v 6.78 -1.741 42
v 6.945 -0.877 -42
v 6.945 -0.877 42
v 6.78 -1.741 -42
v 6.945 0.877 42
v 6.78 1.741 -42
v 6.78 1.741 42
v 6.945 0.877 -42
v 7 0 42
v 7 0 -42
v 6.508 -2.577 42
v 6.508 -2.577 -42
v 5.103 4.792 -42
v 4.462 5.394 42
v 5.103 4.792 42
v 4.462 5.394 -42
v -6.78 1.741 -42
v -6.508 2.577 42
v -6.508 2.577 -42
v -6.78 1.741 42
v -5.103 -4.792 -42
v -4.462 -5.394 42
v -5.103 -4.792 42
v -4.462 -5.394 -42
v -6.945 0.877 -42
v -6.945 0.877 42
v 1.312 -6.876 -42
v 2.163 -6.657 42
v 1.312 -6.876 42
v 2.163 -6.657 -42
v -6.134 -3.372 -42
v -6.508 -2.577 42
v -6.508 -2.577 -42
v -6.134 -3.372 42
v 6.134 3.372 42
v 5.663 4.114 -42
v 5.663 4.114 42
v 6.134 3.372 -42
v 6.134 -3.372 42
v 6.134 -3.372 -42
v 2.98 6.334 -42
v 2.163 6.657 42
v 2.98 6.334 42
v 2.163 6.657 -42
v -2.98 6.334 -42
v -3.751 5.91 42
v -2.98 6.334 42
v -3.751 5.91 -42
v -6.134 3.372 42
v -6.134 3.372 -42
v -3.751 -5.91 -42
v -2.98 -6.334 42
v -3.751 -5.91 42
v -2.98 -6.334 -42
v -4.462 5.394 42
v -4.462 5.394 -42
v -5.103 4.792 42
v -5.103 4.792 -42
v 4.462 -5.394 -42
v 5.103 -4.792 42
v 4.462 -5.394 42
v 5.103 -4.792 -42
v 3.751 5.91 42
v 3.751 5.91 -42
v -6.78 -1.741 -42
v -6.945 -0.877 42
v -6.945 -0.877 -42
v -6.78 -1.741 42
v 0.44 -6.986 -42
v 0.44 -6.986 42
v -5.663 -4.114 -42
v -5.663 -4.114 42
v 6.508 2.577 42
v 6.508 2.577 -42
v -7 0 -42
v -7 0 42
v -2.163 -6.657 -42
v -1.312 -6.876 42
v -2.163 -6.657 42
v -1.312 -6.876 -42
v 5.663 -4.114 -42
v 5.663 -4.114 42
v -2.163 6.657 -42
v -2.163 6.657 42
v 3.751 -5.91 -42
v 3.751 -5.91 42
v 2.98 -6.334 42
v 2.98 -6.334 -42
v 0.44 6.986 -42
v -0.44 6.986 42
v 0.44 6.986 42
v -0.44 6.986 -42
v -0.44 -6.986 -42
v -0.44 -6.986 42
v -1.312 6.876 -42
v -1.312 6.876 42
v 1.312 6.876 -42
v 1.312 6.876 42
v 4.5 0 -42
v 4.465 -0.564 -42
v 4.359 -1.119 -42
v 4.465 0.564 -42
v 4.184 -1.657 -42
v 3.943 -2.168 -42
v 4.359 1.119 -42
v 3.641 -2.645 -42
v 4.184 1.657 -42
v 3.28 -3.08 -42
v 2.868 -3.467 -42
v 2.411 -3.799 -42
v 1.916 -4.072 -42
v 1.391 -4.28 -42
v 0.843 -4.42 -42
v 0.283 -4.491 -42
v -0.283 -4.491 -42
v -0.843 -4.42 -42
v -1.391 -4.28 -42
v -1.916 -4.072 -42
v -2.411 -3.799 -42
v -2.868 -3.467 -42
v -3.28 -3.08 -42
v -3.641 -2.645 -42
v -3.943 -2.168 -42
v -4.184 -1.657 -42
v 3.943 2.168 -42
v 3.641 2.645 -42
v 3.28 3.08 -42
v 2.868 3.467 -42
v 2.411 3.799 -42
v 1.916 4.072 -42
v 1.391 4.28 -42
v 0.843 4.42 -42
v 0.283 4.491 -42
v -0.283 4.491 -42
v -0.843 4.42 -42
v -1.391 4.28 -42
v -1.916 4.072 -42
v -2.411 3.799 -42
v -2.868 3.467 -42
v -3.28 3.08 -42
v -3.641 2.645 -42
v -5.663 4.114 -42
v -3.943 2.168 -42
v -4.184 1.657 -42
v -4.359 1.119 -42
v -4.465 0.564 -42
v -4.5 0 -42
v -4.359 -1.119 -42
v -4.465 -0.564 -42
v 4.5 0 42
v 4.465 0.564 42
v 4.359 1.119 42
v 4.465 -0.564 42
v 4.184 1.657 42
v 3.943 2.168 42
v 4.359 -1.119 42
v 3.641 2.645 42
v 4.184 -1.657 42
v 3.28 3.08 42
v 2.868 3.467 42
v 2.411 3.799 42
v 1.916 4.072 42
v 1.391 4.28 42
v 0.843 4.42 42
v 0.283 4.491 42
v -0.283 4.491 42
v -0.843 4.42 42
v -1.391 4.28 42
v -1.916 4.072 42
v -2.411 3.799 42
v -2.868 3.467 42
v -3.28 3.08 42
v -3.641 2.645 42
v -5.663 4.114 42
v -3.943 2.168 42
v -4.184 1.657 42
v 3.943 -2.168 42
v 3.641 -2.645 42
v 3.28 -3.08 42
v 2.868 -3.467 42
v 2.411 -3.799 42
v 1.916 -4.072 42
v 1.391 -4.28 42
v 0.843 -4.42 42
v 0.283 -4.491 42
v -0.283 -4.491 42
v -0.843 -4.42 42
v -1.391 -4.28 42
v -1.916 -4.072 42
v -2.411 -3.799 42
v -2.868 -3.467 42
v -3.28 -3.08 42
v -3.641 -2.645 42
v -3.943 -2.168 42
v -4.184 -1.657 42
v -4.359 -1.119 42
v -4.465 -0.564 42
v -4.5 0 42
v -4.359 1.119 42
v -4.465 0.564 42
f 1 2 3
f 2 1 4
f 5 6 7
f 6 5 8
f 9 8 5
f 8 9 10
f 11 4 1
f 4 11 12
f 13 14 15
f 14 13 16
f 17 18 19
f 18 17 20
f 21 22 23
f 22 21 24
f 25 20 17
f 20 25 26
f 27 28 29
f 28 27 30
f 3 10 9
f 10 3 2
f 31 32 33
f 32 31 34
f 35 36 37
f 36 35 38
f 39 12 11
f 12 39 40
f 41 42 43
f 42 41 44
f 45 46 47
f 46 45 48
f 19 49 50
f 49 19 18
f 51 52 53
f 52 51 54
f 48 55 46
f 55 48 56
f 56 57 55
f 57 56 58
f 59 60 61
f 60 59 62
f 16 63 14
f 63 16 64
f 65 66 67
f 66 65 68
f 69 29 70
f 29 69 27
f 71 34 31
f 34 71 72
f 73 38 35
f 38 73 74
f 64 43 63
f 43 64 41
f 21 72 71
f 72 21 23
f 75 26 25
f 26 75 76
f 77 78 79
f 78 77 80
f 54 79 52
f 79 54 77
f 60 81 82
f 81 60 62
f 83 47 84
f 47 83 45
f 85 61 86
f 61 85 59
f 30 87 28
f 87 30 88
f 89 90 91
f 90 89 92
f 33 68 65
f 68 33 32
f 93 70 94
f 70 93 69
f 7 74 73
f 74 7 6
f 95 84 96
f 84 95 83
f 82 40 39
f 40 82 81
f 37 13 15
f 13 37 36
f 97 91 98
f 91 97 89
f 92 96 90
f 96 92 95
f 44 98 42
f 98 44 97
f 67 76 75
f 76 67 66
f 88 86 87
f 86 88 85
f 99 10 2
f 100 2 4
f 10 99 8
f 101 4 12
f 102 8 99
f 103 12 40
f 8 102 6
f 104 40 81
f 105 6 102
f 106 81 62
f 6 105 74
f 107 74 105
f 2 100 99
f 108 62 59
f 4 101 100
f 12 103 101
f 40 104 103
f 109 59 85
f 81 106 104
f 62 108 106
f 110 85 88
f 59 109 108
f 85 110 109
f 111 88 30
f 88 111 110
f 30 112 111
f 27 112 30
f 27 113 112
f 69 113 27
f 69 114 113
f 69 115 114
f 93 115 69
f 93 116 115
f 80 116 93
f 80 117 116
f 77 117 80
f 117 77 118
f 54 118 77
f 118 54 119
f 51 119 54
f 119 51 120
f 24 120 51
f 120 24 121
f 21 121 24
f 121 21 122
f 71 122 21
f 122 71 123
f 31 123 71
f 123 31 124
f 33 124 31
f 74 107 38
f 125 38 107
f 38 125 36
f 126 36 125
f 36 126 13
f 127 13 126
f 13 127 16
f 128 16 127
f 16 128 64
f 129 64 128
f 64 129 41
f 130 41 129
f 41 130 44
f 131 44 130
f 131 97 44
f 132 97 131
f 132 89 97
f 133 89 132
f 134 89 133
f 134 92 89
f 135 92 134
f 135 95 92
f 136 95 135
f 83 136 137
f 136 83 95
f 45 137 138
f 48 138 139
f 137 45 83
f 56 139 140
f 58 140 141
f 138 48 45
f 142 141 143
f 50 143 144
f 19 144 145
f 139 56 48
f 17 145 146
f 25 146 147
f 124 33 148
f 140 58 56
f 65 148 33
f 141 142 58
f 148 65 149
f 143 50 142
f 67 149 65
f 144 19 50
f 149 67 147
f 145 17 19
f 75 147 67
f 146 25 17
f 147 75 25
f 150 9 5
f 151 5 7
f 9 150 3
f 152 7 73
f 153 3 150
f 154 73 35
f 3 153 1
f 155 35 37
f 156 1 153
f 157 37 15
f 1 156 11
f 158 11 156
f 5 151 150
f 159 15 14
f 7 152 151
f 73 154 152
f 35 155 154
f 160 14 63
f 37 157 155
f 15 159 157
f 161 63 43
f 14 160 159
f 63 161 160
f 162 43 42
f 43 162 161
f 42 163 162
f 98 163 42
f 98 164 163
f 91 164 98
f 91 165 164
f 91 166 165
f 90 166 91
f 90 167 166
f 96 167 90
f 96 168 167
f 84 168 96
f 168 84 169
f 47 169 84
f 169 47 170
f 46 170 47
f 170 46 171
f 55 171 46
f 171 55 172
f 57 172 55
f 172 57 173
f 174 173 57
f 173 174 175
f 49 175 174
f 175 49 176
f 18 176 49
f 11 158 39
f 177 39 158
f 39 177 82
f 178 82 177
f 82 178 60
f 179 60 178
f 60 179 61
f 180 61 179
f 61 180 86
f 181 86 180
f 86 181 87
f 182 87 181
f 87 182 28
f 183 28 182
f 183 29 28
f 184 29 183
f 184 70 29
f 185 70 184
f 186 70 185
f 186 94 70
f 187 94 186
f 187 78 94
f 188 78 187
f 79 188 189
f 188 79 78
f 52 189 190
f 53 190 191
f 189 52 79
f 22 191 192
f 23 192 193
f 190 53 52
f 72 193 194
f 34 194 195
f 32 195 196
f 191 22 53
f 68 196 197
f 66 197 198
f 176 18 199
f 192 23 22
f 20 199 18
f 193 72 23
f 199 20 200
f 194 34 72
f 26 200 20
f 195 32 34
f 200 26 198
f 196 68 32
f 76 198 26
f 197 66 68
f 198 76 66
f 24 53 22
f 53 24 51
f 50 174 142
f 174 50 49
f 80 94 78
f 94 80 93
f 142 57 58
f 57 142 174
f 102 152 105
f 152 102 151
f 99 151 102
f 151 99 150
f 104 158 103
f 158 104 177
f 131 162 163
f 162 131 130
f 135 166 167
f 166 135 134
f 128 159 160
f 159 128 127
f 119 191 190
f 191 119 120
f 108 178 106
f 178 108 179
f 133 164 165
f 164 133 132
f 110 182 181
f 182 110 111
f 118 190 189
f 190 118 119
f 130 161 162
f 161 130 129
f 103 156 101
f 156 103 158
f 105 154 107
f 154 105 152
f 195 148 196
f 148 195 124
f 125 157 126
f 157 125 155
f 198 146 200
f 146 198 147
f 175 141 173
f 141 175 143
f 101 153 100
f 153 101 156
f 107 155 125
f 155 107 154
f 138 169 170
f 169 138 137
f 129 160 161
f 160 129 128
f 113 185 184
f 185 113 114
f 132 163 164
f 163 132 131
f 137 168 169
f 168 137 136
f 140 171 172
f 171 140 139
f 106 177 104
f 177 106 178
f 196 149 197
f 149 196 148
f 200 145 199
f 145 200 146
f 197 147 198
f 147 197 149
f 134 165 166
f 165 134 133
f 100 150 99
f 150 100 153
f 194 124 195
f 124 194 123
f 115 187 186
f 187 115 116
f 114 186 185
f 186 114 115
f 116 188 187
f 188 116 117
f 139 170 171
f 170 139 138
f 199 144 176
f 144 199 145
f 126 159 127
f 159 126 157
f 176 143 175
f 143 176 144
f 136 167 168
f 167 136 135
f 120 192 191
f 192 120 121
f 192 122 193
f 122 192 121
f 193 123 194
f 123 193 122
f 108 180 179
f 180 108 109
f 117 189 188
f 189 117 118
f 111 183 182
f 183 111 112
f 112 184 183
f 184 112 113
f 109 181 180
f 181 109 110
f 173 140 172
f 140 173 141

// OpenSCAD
$fn = 50;


difference() {
	union() {
		translate(v = [0, 0, -42.0000000000]) {
			cylinder(h = 84, r = 7.0000000000);
		}
	}
	union() {
		translate(v = [0, 0, -100.0000000000]) {
			cylinder(h = 200, r = 4.5000000000);
		}
	}
}
